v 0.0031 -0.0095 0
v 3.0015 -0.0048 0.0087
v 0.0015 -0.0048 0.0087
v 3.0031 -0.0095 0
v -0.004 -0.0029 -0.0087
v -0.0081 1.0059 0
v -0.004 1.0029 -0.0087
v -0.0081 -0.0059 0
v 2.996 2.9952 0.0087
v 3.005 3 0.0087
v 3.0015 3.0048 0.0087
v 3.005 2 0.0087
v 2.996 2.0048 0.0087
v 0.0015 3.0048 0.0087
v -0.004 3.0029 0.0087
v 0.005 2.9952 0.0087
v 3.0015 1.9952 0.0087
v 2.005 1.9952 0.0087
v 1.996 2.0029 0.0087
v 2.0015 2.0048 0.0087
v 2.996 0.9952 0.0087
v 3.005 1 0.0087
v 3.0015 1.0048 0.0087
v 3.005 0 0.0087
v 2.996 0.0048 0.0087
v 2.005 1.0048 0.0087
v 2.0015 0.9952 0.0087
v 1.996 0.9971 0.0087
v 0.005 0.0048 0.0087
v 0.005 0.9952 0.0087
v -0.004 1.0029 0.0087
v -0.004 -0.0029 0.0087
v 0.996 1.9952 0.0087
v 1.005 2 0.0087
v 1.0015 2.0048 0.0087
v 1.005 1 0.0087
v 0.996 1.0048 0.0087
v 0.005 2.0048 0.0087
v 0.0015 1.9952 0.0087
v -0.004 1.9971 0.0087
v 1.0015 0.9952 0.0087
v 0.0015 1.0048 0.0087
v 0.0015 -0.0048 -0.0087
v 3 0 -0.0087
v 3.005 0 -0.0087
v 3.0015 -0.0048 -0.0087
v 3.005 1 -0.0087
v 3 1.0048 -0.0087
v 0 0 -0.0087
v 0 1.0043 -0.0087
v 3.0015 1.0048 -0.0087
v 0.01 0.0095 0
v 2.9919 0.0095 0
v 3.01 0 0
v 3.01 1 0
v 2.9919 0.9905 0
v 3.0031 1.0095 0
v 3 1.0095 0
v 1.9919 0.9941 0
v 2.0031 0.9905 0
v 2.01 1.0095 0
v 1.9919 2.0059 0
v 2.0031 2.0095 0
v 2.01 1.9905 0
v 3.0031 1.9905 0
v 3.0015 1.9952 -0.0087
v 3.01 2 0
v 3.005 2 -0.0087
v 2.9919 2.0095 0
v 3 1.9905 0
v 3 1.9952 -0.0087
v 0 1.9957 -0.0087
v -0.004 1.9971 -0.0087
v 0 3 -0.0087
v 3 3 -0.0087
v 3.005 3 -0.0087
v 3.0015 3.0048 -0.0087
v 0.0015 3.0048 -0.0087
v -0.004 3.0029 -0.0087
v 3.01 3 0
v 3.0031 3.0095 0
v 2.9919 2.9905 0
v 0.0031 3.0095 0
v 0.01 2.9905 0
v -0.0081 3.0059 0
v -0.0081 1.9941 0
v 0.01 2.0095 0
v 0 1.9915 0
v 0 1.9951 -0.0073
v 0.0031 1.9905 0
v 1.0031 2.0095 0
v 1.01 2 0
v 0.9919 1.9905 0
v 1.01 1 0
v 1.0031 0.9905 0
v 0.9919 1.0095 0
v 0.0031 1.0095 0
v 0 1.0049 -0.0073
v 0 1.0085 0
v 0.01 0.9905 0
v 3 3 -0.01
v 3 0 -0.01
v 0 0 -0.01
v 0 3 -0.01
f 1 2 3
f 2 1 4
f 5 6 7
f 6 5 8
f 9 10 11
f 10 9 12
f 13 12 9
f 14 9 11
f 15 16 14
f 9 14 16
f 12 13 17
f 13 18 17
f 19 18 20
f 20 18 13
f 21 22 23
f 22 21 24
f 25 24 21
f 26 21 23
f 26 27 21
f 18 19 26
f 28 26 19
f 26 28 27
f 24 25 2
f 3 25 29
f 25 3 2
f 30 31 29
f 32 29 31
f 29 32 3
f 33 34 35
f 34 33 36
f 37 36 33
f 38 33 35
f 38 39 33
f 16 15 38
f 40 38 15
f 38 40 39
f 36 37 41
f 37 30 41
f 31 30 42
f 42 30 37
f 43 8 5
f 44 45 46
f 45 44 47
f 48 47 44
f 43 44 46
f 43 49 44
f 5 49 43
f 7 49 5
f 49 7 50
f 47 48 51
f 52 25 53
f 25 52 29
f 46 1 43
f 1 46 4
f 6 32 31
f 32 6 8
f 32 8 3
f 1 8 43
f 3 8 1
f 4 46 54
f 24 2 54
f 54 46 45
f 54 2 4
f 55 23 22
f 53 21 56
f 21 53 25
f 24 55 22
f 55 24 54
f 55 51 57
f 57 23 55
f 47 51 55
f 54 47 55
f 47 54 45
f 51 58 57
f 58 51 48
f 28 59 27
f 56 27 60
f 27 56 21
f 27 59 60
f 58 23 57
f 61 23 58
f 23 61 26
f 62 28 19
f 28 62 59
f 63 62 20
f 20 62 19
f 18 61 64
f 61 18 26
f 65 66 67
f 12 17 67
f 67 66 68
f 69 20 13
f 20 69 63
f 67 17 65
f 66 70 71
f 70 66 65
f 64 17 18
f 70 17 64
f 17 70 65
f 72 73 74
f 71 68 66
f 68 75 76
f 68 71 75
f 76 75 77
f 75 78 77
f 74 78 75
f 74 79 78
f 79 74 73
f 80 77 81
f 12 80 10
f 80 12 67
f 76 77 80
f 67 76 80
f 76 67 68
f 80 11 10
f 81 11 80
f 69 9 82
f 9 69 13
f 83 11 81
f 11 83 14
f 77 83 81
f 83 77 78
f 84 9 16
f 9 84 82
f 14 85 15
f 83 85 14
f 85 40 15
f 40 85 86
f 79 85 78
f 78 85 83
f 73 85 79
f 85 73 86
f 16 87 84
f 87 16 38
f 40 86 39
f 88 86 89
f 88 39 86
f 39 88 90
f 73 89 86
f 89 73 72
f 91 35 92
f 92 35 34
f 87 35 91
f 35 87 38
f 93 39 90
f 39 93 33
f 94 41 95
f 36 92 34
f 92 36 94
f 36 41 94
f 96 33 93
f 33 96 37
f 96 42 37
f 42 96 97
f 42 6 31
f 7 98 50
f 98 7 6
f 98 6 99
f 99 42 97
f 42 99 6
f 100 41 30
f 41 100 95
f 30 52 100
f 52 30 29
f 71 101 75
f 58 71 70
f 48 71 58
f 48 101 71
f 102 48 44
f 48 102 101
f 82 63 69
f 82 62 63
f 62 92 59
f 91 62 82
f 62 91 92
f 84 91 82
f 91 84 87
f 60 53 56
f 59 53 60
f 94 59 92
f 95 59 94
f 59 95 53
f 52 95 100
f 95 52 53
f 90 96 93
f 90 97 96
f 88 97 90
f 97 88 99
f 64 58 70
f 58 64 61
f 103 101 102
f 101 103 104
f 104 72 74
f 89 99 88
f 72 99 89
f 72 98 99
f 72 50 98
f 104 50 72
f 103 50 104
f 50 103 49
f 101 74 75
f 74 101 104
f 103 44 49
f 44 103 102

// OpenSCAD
hull(){
    translate([0, 0]) sphere(0.01);
    translate([1, 0]) sphere(0.01);
}
hull(){
    translate([1, 0]) sphere(0.01);
    translate([2, 0]) sphere(0.01);
}
hull(){
    translate([2, 0]) sphere(0.01);
    translate([3, 0]) sphere(0.01);
}
hull(){
    translate([3, 0]) sphere(0.01);
    translate([3, 1]) sphere(0.01);
}
hull(){
    translate([3, 1]) sphere(0.01);
    translate([2, 1]) sphere(0.01);
}
hull(){
    translate([2, 1]) sphere(0.01);
    translate([2, 2]) sphere(0.01);
}
hull(){
    translate([2, 2]) sphere(0.01);
    translate([3, 2]) sphere(0.01);
}
hull(){
    translate([3, 2]) sphere(0.01);
    translate([3, 3]) sphere(0.01);
}
hull(){
    translate([3, 3]) sphere(0.01);
    translate([2, 3]) sphere(0.01);
}
hull(){
    translate([2, 3]) sphere(0.01);
    translate([1, 3]) sphere(0.01);
}
hull(){
    translate([1, 3]) sphere(0.01);
    translate([0, 3]) sphere(0.01);
}
hull(){
    translate([0, 3]) sphere(0.01);
    translate([0, 2]) sphere(0.01);
}
hull(){
    translate([0, 2]) sphere(0.01);
    translate([1, 2]) sphere(0.01);
}
hull(){
    translate([1, 2]) sphere(0.01);
    translate([1, 1]) sphere(0.01);
}
hull(){
    translate([1, 1]) sphere(0.01);
    translate([0, 1]) sphere(0.01);
}
hull(){
    translate([0, 1]) sphere(0.01);
    translate([0, 0]) sphere(0.01);
}
translate([0,0,-0.01]) color([0.1,0.1,0.1]) cube([3,3,0.01]);
